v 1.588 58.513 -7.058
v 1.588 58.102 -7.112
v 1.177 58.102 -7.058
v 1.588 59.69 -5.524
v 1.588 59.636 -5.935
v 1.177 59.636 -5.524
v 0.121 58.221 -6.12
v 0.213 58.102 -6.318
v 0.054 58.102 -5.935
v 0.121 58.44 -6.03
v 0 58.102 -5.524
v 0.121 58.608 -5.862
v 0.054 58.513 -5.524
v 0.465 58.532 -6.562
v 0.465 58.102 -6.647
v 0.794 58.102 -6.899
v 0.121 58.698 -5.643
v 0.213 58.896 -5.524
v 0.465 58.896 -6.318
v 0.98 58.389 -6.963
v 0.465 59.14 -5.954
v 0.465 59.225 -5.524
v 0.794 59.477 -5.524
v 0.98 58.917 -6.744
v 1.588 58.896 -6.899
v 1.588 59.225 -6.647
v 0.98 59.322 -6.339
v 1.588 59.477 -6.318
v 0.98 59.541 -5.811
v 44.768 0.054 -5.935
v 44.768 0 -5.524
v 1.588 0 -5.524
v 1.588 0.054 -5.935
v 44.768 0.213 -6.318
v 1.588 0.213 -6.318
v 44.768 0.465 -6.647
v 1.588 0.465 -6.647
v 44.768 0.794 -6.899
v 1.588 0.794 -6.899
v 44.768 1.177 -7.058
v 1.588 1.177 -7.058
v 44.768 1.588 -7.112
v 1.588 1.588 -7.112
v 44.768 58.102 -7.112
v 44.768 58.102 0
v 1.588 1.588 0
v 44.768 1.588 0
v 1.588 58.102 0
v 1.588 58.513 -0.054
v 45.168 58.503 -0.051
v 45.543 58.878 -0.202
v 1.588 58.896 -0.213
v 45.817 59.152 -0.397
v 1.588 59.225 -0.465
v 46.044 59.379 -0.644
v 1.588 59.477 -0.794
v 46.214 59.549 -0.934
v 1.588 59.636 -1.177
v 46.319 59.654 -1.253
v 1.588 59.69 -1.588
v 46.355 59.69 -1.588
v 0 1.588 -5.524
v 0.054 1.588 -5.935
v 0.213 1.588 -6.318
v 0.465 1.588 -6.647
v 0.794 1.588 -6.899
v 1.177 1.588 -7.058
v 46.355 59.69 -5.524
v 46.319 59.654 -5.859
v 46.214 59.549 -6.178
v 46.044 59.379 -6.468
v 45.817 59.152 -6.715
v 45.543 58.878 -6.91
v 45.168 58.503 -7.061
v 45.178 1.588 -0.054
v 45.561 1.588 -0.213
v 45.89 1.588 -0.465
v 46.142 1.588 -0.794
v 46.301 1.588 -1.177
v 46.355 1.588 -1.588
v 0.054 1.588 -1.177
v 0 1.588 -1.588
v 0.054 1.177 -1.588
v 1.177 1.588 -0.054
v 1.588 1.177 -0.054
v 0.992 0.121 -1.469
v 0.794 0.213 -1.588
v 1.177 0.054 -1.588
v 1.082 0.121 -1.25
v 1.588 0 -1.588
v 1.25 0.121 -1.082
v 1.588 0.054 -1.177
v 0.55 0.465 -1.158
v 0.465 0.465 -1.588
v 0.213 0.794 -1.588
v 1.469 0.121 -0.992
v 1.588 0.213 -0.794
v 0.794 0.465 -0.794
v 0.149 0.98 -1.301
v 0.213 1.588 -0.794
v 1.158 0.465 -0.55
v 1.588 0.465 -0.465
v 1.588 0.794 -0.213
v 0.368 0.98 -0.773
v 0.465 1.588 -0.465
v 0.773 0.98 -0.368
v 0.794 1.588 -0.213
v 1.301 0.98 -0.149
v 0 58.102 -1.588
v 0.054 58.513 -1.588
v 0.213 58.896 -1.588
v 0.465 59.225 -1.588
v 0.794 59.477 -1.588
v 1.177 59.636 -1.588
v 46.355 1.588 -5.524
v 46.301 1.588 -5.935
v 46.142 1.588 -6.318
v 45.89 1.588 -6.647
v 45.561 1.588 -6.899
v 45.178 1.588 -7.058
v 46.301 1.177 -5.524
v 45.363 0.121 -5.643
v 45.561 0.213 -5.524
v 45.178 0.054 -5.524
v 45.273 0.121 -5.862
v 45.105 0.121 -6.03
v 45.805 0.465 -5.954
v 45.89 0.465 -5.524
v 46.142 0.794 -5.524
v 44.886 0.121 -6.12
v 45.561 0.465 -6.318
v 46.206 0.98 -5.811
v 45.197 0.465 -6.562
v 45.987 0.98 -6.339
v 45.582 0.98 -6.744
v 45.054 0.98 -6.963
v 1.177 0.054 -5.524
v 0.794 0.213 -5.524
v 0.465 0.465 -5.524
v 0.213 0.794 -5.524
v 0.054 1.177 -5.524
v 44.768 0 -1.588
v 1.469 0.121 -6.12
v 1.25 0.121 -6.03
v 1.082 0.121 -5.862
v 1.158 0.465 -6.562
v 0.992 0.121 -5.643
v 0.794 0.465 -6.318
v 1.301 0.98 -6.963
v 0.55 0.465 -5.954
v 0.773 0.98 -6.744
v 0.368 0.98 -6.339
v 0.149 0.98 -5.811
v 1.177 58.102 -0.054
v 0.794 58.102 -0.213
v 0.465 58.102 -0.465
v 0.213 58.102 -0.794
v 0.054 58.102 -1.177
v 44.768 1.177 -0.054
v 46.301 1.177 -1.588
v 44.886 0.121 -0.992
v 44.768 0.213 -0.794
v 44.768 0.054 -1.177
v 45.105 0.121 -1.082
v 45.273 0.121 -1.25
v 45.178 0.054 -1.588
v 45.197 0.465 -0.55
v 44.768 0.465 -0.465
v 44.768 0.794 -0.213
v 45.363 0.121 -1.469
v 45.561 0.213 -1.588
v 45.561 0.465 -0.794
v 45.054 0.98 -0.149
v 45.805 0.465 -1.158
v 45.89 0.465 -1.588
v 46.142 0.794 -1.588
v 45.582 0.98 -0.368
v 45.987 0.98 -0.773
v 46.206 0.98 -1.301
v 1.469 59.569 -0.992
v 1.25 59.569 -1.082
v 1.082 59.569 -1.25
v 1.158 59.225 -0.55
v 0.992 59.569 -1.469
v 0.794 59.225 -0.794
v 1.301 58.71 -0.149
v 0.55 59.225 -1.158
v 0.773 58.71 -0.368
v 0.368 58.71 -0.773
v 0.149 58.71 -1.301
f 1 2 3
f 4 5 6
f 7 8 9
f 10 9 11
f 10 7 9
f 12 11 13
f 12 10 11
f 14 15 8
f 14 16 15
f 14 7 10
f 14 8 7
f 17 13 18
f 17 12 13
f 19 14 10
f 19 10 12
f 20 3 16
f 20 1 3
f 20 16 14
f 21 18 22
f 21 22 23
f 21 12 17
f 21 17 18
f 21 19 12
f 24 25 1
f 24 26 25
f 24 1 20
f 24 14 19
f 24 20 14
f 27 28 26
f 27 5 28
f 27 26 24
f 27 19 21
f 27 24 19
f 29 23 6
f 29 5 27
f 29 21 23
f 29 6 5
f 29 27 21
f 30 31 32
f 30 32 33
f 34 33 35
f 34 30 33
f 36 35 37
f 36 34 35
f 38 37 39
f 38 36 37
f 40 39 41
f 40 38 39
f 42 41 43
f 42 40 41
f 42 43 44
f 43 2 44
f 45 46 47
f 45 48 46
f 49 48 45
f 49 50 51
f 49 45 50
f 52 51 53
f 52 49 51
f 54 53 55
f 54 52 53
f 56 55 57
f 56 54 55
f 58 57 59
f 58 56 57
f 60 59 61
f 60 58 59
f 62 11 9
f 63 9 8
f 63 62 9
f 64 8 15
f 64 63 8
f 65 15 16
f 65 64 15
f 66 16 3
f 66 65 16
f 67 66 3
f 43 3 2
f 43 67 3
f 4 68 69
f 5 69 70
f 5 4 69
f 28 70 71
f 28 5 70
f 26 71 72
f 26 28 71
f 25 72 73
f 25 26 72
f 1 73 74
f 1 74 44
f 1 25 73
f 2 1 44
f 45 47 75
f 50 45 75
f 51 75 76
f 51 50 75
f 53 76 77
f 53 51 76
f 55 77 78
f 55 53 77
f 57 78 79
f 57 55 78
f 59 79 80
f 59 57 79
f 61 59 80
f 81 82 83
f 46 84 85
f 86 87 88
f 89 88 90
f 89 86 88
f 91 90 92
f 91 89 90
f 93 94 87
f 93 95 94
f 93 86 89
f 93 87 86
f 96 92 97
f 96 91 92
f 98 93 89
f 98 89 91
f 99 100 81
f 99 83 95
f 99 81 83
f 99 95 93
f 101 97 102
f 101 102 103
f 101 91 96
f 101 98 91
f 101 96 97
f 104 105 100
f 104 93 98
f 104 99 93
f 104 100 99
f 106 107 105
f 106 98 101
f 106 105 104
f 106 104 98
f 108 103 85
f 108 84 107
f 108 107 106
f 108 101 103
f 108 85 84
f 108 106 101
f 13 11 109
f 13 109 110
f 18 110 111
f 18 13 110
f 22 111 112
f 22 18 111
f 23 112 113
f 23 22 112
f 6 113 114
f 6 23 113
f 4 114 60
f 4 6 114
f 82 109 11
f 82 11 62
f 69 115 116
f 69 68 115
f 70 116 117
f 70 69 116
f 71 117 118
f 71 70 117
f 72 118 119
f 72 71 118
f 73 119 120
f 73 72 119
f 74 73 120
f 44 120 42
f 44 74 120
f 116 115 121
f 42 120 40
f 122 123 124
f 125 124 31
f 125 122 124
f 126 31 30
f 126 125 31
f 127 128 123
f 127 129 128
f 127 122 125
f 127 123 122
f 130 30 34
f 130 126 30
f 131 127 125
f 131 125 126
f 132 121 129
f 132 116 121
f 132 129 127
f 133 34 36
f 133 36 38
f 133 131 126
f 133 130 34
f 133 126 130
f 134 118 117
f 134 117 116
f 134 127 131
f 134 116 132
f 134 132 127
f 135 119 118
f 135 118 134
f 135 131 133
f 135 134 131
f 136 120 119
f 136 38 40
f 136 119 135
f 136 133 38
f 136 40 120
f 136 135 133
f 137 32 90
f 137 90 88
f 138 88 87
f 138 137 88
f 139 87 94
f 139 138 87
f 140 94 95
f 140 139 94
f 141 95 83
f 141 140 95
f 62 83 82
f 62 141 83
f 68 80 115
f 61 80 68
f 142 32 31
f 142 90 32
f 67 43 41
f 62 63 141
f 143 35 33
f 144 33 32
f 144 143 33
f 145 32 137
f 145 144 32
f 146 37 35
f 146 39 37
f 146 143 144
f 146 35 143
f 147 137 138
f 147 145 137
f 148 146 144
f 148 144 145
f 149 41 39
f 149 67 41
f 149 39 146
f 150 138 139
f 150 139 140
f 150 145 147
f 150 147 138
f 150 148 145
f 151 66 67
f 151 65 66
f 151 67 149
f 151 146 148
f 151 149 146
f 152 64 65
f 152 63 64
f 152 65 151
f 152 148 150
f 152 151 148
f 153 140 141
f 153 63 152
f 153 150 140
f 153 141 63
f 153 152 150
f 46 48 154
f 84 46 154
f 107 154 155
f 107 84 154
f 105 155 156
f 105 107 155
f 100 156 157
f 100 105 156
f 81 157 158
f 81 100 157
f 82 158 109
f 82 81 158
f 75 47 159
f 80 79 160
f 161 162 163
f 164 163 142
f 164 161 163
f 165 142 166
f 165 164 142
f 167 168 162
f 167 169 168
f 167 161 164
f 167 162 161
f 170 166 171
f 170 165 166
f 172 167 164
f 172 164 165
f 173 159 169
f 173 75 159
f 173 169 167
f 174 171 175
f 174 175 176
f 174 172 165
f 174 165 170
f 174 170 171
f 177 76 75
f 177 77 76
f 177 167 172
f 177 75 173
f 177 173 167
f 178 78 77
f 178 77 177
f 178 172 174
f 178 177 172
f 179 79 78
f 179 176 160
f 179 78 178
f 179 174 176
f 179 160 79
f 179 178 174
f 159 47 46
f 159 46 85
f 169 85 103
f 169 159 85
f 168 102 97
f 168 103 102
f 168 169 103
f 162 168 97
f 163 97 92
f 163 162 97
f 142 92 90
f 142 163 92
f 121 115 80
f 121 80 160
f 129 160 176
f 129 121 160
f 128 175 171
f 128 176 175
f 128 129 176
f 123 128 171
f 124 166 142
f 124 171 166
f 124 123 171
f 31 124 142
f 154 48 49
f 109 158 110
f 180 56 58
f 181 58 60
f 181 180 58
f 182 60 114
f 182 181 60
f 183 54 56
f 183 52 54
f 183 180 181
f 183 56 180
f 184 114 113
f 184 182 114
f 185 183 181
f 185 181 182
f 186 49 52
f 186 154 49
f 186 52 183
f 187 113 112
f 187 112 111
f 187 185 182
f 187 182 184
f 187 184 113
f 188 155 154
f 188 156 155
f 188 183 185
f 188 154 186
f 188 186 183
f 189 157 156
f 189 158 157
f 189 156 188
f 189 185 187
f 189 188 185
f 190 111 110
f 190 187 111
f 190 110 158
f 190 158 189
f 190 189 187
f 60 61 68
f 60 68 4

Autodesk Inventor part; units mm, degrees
ref_plane "YZ Plane" through (0, 0, 0) normal (1, 0, 0) x (0, 1, 0)
ref_plane "XZ Plane" through (0, 0, 0) normal (0, 1, 0) x (-1, 0, 0)
ref_plane "XY Plane" through (0, 0, 0) normal (0, 0, 1) x (1, 0, 0)
sketch "Sketch1" plane through (0, 0, 0) normal (0, 0, 1) x (1, 0, 0)
  line L0 (0, 0) -> (46.355, 0)
  line L1 (46.355, 0) -> (46.355, 59.69)
  line L2 (46.355, 59.69) -> (0, 59.69)
  line L3 (0, 59.69) -> (0, 0)
  dimension "d0" = 46.355
  dimension "d1" = 59.69
extrude "Extrusion1" add sketch "Sketch1" against normal blind 7.112
fillet "Fillet1" radius 1.5875 11 edges at (0, 29.845, 0) (23.1775, 59.69, 0) (46.355, 29.845, 0) (23.1775, 0, 0) (23.1775, 59.69, -7.112) (46.355, 29.845, -7.112) (0, 29.845, -7.112) (23.1775, 0, -7.112) (46.355, 0, -3.556) (0, 59.69, -3.556) (0, 0, -3.556)
properties part number "328 Adafruit 2.5 Ah Lithium Battery"
